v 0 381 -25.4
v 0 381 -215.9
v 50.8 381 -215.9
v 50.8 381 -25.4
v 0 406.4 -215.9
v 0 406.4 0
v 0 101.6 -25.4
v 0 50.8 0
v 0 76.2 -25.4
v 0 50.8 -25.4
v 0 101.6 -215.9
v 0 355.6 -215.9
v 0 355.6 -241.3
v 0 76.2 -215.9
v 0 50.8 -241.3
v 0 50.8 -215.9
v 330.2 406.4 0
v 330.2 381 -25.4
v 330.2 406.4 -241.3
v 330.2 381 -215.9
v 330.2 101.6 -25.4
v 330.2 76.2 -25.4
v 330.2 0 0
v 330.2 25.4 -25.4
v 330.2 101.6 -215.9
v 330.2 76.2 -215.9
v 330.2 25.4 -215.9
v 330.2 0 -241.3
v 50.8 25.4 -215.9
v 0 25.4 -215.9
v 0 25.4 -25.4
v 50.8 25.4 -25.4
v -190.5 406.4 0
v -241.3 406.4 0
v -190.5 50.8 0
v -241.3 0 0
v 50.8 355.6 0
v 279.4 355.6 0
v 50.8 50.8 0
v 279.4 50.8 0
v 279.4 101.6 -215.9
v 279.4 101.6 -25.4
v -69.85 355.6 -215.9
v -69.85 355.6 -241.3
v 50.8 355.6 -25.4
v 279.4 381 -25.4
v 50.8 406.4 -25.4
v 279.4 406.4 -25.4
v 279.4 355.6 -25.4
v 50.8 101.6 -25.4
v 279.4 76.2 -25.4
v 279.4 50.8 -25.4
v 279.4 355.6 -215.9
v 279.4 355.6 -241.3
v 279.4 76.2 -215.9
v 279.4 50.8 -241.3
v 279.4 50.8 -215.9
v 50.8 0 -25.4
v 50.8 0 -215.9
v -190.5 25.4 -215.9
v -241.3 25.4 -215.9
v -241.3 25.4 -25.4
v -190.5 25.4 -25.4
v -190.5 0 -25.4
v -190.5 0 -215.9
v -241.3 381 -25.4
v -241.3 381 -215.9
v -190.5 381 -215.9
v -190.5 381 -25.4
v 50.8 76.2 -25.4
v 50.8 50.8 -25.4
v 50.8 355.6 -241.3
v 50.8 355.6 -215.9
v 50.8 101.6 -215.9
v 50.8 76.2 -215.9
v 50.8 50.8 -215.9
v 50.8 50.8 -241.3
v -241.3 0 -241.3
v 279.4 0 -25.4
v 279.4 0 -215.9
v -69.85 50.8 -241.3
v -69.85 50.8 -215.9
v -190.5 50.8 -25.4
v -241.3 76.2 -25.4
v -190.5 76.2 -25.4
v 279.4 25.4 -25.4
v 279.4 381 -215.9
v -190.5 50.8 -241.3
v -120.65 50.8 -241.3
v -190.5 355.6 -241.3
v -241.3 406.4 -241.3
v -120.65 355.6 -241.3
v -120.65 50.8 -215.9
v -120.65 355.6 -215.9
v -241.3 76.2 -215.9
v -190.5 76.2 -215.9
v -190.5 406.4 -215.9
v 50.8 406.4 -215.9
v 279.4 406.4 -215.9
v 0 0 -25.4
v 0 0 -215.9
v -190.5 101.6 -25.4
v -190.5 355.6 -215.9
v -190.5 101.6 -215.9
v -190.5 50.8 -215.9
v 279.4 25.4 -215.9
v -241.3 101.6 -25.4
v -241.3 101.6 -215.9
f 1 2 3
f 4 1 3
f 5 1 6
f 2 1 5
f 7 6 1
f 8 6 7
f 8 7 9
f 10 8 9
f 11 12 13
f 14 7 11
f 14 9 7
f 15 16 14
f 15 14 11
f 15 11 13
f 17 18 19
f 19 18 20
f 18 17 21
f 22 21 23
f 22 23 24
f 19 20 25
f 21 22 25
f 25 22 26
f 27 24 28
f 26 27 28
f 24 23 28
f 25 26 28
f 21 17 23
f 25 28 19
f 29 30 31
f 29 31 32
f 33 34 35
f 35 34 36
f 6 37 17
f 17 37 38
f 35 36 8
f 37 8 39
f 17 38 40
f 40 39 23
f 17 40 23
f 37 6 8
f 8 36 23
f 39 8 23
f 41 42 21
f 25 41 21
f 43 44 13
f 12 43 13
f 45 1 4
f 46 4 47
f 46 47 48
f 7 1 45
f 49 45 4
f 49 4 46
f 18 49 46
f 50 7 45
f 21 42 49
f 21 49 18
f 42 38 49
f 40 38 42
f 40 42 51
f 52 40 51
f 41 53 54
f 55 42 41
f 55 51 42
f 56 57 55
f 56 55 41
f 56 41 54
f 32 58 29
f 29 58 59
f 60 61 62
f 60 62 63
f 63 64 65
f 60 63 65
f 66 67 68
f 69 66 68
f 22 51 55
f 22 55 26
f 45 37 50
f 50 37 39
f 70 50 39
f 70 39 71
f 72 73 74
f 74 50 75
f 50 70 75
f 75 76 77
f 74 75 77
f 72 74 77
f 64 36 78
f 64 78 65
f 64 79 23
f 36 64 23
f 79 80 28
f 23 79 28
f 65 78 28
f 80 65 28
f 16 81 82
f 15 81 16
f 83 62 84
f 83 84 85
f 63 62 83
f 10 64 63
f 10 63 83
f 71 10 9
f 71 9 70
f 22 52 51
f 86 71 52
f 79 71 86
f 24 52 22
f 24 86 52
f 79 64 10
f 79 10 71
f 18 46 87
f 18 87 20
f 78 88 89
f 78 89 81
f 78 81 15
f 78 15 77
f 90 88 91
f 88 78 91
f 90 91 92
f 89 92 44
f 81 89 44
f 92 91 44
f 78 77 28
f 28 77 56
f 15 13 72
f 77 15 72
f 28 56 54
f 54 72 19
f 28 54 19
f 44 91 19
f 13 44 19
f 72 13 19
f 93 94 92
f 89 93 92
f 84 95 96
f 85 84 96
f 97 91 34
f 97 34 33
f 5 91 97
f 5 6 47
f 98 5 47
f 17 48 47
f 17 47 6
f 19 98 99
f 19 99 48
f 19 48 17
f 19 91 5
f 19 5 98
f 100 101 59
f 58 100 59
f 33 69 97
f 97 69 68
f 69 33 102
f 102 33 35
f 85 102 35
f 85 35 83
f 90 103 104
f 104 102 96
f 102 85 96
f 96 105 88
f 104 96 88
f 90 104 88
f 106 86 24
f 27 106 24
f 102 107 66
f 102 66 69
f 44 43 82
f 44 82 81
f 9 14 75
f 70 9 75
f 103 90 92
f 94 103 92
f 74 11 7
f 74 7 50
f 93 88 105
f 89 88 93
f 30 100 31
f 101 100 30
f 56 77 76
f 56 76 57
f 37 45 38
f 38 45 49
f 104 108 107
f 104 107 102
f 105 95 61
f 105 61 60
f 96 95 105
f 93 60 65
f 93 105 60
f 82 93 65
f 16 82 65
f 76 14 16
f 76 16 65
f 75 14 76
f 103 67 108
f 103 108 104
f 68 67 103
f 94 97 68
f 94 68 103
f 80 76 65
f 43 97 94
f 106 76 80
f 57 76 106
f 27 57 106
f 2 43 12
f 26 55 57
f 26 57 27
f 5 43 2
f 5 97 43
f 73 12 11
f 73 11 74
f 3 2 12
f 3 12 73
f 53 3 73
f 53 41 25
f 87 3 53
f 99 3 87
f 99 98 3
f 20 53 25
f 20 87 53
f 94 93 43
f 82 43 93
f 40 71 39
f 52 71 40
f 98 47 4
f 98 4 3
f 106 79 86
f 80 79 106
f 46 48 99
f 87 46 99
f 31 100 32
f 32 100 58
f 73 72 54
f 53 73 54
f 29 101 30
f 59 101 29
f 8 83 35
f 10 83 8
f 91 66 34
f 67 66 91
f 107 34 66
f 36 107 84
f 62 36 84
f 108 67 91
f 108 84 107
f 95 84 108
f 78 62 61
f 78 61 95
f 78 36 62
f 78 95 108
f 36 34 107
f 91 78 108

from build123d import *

# Parameters (mm, degrees)
SKETCH1_W             = 190.5
SKETCH1_H             = 25.4
BOSS_EXTRUDE1_DEPTH   = 50.8
BOSS_EXTRUDE1_2_DEPTH = 50.8
SKETCH1_W_2           = 228.6
BOSS_EXTRUDE1_3_DEPTH = 50.8
BOSS_EXTRUDE1_4_DEPTH = 50.8
SKETCH1_3_W           = 50.8
SKETCH1_3_H           = 190.5
BOSS_EXTRUDE2_DEPTH   = 25.4
BOSS_EXTRUDE2_2_DEPTH = 25.4
BOSS_EXTRUDE2_3_DEPTH = 25.4
SKETCH1_4_W           = 50.8
SKETCH1_4_H           = 25.4
BOSS_EXTRUDE3_DEPTH   = 406.4
SKETCH2_W             = 228.6
SKETCH2_H             = 25.4
SKETCH2_W_2           = 69.85
BOSS_EXTRUDE8_DEPTH   = 50.8
SKETCH2_3_W           = 50.8
SKETCH2_3_H           = 190.5
BOSS_EXTRUDE9_DEPTH   = 25.4
SKETCH2_4_W           = 50.8
SKETCH2_4_H           = 25.4
BOSS_EXTRUDE10_DEPTH  = 355.6
SKETCH3_W             = 50.8
SKETCH3_H             = 25.4
BOSS_EXTRUDE11_DEPTH  = 190.5


with BuildPart() as part:
    # Sketch1 → Boss-Extrude1 (new body)
    with BuildSketch(Plane(origin=(0, 0, 0), x_dir=(1, 0, 0), z_dir=(0, 1, 0))):
        with Locations((-95.25, 12.7)):
            Rectangle(SKETCH1_W, SKETCH1_H)
    extrude(amount=BOSS_EXTRUDE1_DEPTH)


with BuildPart() as body_2:
    # Sketch1 → Boss-Extrude1 2 (new body)
    with BuildSketch(Plane(origin=(0, 0, 0), x_dir=(1, 0, 0), z_dir=(0, 1, 0))):
        with Locations((-95.25, 228.6)):
            Rectangle(SKETCH1_W, SKETCH1_H)
    extrude(amount=BOSS_EXTRUDE1_2_DEPTH)



with BuildPart() as body_3:
    # Sketch1 → Boss-Extrude1 3 (new body)
    with BuildSketch(Plane(origin=(0, 0, 0), x_dir=(1, 0, 0), z_dir=(0, 1, 0))):
        with Locations((165.1, 228.6)):
            Rectangle(SKETCH1_W_2, SKETCH1_H)
    extrude(amount=BOSS_EXTRUDE1_3_DEPTH)



with BuildPart() as body_4:
    # Sketch1 → Boss-Extrude1 4 (new body)
    with BuildSketch(Plane(origin=(0, 0, 0), x_dir=(1, 0, 0), z_dir=(0, 1, 0))):
        with Locations((165.1, 12.7)):
            Rectangle(SKETCH1_W_2, SKETCH1_H)
    extrude(amount=BOSS_EXTRUDE1_4_DEPTH)


with BuildPart() as body_5:
    # Sketch1<3> → Boss-Extrude2 (new body)
    with BuildSketch(Plane(origin=(0, 0, 0), x_dir=(1, 0, 0), z_dir=(0, 1, 0))):
        with Locations((25.4, 120.65)):
            Rectangle(SKETCH1_3_W, SKETCH1_3_H)
    extrude(amount=BOSS_EXTRUDE2_DEPTH)


with BuildPart() as body_6:
    # Sketch1<3> → Boss-Extrude2 2 (new body)
    with BuildSketch(Plane(origin=(0, 0, 0), x_dir=(1, 0, 0), z_dir=(0, 1, 0))):
        with Locations((304.8, 120.65)):
            Rectangle(SKETCH1_3_W, SKETCH1_3_H)
    extrude(amount=BOSS_EXTRUDE2_2_DEPTH)


with BuildPart() as body_7:
    # Sketch1<3> → Boss-Extrude2 3 (new body)
    with BuildSketch(Plane(origin=(0, 0, 0), x_dir=(1, 0, 0), z_dir=(0, 1, 0))):
        with Locations((-215.9, 120.65)):
            Rectangle(SKETCH1_3_W, SKETCH1_3_H)
    extrude(amount=BOSS_EXTRUDE2_3_DEPTH)


with BuildPart() as body_3_1:
    add(body_3.part)

    add(body_6.part)  # Boss-Extrude3 merges body 6

    add(body_4.part)  # Boss-Extrude3 merges body 4

    add(part.part)  # Boss-Extrude3 merges part

    add(body_7.part)  # Boss-Extrude3 merges body 7
    # Sketch1<4> → Boss-Extrude3 (add)
    with BuildSketch(Plane(origin=(0, 0, 0), x_dir=(1, 0, 0), z_dir=(0, 1, 0))):
        with Locations((25.4, 12.7)):
            Rectangle(SKETCH1_4_W, SKETCH1_4_H)
        with Locations((25.4, 228.6)):
            Rectangle(SKETCH1_4_W, SKETCH1_4_H)
        with Locations((304.8, 228.6)):
            Rectangle(SKETCH1_4_W, SKETCH1_4_H)
        with Locations((304.8, 12.7)):
            Rectangle(SKETCH1_4_W, SKETCH1_4_H)
        with Locations((-215.9, 12.7)):
            Rectangle(SKETCH1_4_W, SKETCH1_4_H)
        with Locations((-215.9, 228.6)):
            Rectangle(SKETCH1_4_W, SKETCH1_4_H)
    extrude(amount=BOSS_EXTRUDE3_DEPTH)

    # Sketch2 → Boss-Extrude8 (add)
    with BuildSketch(Plane(origin=(0, 406.4, 0), x_dir=(1, 0, 0), z_dir=(0, 1, 0))):
        with Locations((165.1, 228.6)):
            Rectangle(SKETCH2_W, SKETCH2_H)
        with Locations((-34.925, 228.6)):
            Rectangle(SKETCH2_W_2, SKETCH2_H)
        with Locations((-155.575, 228.6)):
            Rectangle(SKETCH2_W_2, SKETCH2_H)
        with Locations((165.1, 12.7)):
            Rectangle(SKETCH2_W, SKETCH2_H)
    extrude(amount=-BOSS_EXTRUDE8_DEPTH)

    # Sketch2<3> → Boss-Extrude9 (add)
    with BuildSketch(Plane(origin=(0, 406.4, 0), x_dir=(1, 0, 0), z_dir=(0, 1, 0))):
        with Locations((25.4, 120.65)):
            Rectangle(SKETCH2_3_W, SKETCH2_3_H)
        with Locations((304.8, 120.65)):
            Rectangle(SKETCH2_3_W, SKETCH2_3_H)
        with Locations((-215.9, 120.65)):
            Rectangle(SKETCH2_3_W, SKETCH2_3_H)
    extrude(amount=-BOSS_EXTRUDE9_DEPTH)


with BuildPart() as body_2_1:
    add(body_2.part)

    add(body_3_1.part)  # Boss-Extrude10 merges body 3
    # Sketch2<4> → Boss-Extrude10 (add)
    with BuildSketch(Plane(origin=(0, 406.4, 0), x_dir=(1, 0, 0), z_dir=(0, 1, 0))):
        with Locations((-95.25, 228.6)):
            Rectangle(SKETCH2_4_W, SKETCH2_4_H)
    extrude(amount=-BOSS_EXTRUDE10_DEPTH)

    # Sketch3 → Boss-Extrude11 (add)
    with BuildSketch(Plane.XY.offset(-215.9)):
        with Locations((-215.9, 88.9)):
            Rectangle(SKETCH3_W, SKETCH3_H)
        with Locations((25.4, 88.9)):
            Rectangle(SKETCH3_W, SKETCH3_H)
        with Locations((304.8, 88.9)):
            Rectangle(SKETCH3_W, SKETCH3_H)
    extrude(amount=BOSS_EXTRUDE11_DEPTH)


solid = Compound([body_5.part, body_2_1.part])
